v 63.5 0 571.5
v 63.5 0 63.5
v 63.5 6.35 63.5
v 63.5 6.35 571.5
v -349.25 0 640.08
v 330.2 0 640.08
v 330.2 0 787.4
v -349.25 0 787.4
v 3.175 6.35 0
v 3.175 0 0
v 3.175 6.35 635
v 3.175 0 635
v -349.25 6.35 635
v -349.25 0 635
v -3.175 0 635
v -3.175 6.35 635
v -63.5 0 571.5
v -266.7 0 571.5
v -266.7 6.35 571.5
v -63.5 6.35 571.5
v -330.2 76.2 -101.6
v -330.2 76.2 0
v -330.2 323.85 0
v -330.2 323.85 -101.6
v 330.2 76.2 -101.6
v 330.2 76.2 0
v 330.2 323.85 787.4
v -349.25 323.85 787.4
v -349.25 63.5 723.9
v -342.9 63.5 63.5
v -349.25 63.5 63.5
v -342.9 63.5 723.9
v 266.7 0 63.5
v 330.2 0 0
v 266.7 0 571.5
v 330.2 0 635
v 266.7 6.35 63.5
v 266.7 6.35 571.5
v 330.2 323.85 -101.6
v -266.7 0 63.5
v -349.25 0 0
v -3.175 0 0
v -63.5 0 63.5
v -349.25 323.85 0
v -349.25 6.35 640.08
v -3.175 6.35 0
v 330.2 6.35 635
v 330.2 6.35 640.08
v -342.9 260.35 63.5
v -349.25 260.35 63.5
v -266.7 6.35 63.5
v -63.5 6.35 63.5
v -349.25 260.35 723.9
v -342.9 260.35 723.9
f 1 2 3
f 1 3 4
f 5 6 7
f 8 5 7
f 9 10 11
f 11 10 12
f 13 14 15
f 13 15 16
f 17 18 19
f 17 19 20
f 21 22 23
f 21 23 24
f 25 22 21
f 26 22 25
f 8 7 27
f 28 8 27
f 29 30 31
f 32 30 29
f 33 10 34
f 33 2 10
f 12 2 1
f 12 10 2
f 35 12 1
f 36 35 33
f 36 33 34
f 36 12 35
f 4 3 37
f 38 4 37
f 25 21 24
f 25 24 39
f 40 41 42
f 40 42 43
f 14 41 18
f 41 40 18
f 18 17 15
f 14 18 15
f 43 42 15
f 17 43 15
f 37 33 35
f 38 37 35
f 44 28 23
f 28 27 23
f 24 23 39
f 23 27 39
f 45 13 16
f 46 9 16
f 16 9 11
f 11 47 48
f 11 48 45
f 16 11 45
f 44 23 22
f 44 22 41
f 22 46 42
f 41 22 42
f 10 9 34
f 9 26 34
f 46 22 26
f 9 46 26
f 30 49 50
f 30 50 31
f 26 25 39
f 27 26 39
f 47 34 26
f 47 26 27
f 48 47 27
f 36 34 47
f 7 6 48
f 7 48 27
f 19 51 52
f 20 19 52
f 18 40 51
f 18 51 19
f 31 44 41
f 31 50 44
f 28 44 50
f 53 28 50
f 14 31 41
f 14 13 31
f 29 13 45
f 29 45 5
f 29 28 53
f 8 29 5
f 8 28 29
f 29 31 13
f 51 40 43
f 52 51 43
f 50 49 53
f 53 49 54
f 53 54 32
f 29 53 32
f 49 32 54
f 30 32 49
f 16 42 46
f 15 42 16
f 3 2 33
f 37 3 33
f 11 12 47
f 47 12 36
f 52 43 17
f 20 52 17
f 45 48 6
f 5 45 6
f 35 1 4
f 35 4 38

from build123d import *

# Parameters (mm, degrees)
F0_W     = 3.175
F0_H     = 635
F0_W_2   = 327.025
F0_W_3   = 203.2
F0_H_2   = 508
F0_W_4   = 330.2
F0_H_3   = 147.32
F1_DEPTH = 323.85
F2_DEPTH = 6.35
F3_DEPTH = 76.2
F4_W     = 196.85
F4_H     = 660.4
F5_DEPTH = 19.05
F6_DEPTH = 12.7


with BuildPart() as f1:
    # F0 (on Front) → F1 (new body)
    with BuildSketch(Plane.XZ):
        Polygon((0, -101.6), (0, 0), (-3.175, 0), (-330.2, 0), (-330.2, -101.6), align=None)
        with Locations((-1.5875, 317.5)):
            Rectangle(F0_W, F0_H)
        Polygon((3.175, 0), (0, 0), (0, -101.6), (330.2, -101.6), (330.2, 0), align=None)
        with Locations((1.5875, 317.5)):
            Rectangle(F0_W, F0_H)
        with Locations((-166.6875, 317.5)):
            Rectangle(F0_W_2, F0_H)
        with Locations((-165.1, 317.5)):
            Rectangle(F0_W_3, F0_H_2, mode=Mode.SUBTRACT)
        Polygon((-3.175, 635), (0, 635), (0, 640.08), (-330.2, 640.08), (-330.2, 635), align=None)
        Polygon((0, 640.08), (0, 635), (3.175, 635), (330.2, 635), (330.2, 640.08), align=None)
        with Locations((166.6875, 317.5)):
            Rectangle(F0_W_2, F0_H)
        with Locations((165.1, 317.5)):
            Rectangle(F0_W_3, F0_H_2, mode=Mode.SUBTRACT)
        with Locations((-165.1, 713.74)):
            Rectangle(F0_W_4, F0_H_3)
        with Locations((165.1, 713.74)):
            Rectangle(F0_W_4, F0_H_3)
        with Locations((-165.1, 317.5)):
            Rectangle(F0_W_3, F0_H_2)
        with Locations((165.1, 317.5)):
            Rectangle(F0_W_3, F0_H_2)
    extrude(amount=-F1_DEPTH)

    # F0 (on Front) → F2 (cut)
    with BuildSketch(Plane.XZ):
        Polygon((0, -101.6), (0, 0), (-3.175, 0), (-330.2, 0), (-330.2, -101.6), align=None)
        with Locations((-1.5875, 317.5)):
            Rectangle(F0_W, F0_H)
        with Locations((1.5875, 317.5)):
            Rectangle(F0_W, F0_H)
        Polygon((-3.175, 635), (0, 635), (0, 640.08), (-330.2, 640.08), (-330.2, 635), align=None)
        Polygon((0, 640.08), (0, 635), (3.175, 635), (330.2, 635), (330.2, 640.08), align=None)
        with Locations((-165.1, 317.5)):
            Rectangle(F0_W_3, F0_H_2)
        with Locations((165.1, 317.5)):
            Rectangle(F0_W_3, F0_H_2)
    extrude(amount=-F2_DEPTH, mode=Mode.SUBTRACT)

    # F0 (on Front) → F3 (cut)
    with BuildSketch(Plane.XZ):
        Polygon((0, -101.6), (0, 0), (-3.175, 0), (-330.2, 0), (-330.2, -101.6), align=None)
        Polygon((3.175, 0), (0, 0), (0, -101.6), (330.2, -101.6), (330.2, 0), align=None)
    extrude(amount=-F3_DEPTH, mode=Mode.SUBTRACT)

    # F4 (on face) → F5 (join)
    with BuildSketch(Plane(origin=(-330.2, 0, 0), x_dir=(0, -1, 0), z_dir=(-1, 0, 0))):
        Polygon((0, 787.4), (-323.85, 787.4), (-323.85, 0), (-76.2, 0), (0, 0), (0, 635), (-6.35, 635), (-6.35, 640.08), (0, 640.08), align=None)
        with Locations((-161.925, 393.7)):
            Rectangle(F4_W, F4_H, mode=Mode.SUBTRACT)
    extrude(amount=F5_DEPTH)

    # F6 (add): a face of the model
    f6_faces = [f1.faces().sort_by_distance(p)[0] for p in [
        (-330.2, 161.925, 393.7),
    ]]
    extrude(f6_faces, amount=F6_DEPTH)


solid = f1.part
